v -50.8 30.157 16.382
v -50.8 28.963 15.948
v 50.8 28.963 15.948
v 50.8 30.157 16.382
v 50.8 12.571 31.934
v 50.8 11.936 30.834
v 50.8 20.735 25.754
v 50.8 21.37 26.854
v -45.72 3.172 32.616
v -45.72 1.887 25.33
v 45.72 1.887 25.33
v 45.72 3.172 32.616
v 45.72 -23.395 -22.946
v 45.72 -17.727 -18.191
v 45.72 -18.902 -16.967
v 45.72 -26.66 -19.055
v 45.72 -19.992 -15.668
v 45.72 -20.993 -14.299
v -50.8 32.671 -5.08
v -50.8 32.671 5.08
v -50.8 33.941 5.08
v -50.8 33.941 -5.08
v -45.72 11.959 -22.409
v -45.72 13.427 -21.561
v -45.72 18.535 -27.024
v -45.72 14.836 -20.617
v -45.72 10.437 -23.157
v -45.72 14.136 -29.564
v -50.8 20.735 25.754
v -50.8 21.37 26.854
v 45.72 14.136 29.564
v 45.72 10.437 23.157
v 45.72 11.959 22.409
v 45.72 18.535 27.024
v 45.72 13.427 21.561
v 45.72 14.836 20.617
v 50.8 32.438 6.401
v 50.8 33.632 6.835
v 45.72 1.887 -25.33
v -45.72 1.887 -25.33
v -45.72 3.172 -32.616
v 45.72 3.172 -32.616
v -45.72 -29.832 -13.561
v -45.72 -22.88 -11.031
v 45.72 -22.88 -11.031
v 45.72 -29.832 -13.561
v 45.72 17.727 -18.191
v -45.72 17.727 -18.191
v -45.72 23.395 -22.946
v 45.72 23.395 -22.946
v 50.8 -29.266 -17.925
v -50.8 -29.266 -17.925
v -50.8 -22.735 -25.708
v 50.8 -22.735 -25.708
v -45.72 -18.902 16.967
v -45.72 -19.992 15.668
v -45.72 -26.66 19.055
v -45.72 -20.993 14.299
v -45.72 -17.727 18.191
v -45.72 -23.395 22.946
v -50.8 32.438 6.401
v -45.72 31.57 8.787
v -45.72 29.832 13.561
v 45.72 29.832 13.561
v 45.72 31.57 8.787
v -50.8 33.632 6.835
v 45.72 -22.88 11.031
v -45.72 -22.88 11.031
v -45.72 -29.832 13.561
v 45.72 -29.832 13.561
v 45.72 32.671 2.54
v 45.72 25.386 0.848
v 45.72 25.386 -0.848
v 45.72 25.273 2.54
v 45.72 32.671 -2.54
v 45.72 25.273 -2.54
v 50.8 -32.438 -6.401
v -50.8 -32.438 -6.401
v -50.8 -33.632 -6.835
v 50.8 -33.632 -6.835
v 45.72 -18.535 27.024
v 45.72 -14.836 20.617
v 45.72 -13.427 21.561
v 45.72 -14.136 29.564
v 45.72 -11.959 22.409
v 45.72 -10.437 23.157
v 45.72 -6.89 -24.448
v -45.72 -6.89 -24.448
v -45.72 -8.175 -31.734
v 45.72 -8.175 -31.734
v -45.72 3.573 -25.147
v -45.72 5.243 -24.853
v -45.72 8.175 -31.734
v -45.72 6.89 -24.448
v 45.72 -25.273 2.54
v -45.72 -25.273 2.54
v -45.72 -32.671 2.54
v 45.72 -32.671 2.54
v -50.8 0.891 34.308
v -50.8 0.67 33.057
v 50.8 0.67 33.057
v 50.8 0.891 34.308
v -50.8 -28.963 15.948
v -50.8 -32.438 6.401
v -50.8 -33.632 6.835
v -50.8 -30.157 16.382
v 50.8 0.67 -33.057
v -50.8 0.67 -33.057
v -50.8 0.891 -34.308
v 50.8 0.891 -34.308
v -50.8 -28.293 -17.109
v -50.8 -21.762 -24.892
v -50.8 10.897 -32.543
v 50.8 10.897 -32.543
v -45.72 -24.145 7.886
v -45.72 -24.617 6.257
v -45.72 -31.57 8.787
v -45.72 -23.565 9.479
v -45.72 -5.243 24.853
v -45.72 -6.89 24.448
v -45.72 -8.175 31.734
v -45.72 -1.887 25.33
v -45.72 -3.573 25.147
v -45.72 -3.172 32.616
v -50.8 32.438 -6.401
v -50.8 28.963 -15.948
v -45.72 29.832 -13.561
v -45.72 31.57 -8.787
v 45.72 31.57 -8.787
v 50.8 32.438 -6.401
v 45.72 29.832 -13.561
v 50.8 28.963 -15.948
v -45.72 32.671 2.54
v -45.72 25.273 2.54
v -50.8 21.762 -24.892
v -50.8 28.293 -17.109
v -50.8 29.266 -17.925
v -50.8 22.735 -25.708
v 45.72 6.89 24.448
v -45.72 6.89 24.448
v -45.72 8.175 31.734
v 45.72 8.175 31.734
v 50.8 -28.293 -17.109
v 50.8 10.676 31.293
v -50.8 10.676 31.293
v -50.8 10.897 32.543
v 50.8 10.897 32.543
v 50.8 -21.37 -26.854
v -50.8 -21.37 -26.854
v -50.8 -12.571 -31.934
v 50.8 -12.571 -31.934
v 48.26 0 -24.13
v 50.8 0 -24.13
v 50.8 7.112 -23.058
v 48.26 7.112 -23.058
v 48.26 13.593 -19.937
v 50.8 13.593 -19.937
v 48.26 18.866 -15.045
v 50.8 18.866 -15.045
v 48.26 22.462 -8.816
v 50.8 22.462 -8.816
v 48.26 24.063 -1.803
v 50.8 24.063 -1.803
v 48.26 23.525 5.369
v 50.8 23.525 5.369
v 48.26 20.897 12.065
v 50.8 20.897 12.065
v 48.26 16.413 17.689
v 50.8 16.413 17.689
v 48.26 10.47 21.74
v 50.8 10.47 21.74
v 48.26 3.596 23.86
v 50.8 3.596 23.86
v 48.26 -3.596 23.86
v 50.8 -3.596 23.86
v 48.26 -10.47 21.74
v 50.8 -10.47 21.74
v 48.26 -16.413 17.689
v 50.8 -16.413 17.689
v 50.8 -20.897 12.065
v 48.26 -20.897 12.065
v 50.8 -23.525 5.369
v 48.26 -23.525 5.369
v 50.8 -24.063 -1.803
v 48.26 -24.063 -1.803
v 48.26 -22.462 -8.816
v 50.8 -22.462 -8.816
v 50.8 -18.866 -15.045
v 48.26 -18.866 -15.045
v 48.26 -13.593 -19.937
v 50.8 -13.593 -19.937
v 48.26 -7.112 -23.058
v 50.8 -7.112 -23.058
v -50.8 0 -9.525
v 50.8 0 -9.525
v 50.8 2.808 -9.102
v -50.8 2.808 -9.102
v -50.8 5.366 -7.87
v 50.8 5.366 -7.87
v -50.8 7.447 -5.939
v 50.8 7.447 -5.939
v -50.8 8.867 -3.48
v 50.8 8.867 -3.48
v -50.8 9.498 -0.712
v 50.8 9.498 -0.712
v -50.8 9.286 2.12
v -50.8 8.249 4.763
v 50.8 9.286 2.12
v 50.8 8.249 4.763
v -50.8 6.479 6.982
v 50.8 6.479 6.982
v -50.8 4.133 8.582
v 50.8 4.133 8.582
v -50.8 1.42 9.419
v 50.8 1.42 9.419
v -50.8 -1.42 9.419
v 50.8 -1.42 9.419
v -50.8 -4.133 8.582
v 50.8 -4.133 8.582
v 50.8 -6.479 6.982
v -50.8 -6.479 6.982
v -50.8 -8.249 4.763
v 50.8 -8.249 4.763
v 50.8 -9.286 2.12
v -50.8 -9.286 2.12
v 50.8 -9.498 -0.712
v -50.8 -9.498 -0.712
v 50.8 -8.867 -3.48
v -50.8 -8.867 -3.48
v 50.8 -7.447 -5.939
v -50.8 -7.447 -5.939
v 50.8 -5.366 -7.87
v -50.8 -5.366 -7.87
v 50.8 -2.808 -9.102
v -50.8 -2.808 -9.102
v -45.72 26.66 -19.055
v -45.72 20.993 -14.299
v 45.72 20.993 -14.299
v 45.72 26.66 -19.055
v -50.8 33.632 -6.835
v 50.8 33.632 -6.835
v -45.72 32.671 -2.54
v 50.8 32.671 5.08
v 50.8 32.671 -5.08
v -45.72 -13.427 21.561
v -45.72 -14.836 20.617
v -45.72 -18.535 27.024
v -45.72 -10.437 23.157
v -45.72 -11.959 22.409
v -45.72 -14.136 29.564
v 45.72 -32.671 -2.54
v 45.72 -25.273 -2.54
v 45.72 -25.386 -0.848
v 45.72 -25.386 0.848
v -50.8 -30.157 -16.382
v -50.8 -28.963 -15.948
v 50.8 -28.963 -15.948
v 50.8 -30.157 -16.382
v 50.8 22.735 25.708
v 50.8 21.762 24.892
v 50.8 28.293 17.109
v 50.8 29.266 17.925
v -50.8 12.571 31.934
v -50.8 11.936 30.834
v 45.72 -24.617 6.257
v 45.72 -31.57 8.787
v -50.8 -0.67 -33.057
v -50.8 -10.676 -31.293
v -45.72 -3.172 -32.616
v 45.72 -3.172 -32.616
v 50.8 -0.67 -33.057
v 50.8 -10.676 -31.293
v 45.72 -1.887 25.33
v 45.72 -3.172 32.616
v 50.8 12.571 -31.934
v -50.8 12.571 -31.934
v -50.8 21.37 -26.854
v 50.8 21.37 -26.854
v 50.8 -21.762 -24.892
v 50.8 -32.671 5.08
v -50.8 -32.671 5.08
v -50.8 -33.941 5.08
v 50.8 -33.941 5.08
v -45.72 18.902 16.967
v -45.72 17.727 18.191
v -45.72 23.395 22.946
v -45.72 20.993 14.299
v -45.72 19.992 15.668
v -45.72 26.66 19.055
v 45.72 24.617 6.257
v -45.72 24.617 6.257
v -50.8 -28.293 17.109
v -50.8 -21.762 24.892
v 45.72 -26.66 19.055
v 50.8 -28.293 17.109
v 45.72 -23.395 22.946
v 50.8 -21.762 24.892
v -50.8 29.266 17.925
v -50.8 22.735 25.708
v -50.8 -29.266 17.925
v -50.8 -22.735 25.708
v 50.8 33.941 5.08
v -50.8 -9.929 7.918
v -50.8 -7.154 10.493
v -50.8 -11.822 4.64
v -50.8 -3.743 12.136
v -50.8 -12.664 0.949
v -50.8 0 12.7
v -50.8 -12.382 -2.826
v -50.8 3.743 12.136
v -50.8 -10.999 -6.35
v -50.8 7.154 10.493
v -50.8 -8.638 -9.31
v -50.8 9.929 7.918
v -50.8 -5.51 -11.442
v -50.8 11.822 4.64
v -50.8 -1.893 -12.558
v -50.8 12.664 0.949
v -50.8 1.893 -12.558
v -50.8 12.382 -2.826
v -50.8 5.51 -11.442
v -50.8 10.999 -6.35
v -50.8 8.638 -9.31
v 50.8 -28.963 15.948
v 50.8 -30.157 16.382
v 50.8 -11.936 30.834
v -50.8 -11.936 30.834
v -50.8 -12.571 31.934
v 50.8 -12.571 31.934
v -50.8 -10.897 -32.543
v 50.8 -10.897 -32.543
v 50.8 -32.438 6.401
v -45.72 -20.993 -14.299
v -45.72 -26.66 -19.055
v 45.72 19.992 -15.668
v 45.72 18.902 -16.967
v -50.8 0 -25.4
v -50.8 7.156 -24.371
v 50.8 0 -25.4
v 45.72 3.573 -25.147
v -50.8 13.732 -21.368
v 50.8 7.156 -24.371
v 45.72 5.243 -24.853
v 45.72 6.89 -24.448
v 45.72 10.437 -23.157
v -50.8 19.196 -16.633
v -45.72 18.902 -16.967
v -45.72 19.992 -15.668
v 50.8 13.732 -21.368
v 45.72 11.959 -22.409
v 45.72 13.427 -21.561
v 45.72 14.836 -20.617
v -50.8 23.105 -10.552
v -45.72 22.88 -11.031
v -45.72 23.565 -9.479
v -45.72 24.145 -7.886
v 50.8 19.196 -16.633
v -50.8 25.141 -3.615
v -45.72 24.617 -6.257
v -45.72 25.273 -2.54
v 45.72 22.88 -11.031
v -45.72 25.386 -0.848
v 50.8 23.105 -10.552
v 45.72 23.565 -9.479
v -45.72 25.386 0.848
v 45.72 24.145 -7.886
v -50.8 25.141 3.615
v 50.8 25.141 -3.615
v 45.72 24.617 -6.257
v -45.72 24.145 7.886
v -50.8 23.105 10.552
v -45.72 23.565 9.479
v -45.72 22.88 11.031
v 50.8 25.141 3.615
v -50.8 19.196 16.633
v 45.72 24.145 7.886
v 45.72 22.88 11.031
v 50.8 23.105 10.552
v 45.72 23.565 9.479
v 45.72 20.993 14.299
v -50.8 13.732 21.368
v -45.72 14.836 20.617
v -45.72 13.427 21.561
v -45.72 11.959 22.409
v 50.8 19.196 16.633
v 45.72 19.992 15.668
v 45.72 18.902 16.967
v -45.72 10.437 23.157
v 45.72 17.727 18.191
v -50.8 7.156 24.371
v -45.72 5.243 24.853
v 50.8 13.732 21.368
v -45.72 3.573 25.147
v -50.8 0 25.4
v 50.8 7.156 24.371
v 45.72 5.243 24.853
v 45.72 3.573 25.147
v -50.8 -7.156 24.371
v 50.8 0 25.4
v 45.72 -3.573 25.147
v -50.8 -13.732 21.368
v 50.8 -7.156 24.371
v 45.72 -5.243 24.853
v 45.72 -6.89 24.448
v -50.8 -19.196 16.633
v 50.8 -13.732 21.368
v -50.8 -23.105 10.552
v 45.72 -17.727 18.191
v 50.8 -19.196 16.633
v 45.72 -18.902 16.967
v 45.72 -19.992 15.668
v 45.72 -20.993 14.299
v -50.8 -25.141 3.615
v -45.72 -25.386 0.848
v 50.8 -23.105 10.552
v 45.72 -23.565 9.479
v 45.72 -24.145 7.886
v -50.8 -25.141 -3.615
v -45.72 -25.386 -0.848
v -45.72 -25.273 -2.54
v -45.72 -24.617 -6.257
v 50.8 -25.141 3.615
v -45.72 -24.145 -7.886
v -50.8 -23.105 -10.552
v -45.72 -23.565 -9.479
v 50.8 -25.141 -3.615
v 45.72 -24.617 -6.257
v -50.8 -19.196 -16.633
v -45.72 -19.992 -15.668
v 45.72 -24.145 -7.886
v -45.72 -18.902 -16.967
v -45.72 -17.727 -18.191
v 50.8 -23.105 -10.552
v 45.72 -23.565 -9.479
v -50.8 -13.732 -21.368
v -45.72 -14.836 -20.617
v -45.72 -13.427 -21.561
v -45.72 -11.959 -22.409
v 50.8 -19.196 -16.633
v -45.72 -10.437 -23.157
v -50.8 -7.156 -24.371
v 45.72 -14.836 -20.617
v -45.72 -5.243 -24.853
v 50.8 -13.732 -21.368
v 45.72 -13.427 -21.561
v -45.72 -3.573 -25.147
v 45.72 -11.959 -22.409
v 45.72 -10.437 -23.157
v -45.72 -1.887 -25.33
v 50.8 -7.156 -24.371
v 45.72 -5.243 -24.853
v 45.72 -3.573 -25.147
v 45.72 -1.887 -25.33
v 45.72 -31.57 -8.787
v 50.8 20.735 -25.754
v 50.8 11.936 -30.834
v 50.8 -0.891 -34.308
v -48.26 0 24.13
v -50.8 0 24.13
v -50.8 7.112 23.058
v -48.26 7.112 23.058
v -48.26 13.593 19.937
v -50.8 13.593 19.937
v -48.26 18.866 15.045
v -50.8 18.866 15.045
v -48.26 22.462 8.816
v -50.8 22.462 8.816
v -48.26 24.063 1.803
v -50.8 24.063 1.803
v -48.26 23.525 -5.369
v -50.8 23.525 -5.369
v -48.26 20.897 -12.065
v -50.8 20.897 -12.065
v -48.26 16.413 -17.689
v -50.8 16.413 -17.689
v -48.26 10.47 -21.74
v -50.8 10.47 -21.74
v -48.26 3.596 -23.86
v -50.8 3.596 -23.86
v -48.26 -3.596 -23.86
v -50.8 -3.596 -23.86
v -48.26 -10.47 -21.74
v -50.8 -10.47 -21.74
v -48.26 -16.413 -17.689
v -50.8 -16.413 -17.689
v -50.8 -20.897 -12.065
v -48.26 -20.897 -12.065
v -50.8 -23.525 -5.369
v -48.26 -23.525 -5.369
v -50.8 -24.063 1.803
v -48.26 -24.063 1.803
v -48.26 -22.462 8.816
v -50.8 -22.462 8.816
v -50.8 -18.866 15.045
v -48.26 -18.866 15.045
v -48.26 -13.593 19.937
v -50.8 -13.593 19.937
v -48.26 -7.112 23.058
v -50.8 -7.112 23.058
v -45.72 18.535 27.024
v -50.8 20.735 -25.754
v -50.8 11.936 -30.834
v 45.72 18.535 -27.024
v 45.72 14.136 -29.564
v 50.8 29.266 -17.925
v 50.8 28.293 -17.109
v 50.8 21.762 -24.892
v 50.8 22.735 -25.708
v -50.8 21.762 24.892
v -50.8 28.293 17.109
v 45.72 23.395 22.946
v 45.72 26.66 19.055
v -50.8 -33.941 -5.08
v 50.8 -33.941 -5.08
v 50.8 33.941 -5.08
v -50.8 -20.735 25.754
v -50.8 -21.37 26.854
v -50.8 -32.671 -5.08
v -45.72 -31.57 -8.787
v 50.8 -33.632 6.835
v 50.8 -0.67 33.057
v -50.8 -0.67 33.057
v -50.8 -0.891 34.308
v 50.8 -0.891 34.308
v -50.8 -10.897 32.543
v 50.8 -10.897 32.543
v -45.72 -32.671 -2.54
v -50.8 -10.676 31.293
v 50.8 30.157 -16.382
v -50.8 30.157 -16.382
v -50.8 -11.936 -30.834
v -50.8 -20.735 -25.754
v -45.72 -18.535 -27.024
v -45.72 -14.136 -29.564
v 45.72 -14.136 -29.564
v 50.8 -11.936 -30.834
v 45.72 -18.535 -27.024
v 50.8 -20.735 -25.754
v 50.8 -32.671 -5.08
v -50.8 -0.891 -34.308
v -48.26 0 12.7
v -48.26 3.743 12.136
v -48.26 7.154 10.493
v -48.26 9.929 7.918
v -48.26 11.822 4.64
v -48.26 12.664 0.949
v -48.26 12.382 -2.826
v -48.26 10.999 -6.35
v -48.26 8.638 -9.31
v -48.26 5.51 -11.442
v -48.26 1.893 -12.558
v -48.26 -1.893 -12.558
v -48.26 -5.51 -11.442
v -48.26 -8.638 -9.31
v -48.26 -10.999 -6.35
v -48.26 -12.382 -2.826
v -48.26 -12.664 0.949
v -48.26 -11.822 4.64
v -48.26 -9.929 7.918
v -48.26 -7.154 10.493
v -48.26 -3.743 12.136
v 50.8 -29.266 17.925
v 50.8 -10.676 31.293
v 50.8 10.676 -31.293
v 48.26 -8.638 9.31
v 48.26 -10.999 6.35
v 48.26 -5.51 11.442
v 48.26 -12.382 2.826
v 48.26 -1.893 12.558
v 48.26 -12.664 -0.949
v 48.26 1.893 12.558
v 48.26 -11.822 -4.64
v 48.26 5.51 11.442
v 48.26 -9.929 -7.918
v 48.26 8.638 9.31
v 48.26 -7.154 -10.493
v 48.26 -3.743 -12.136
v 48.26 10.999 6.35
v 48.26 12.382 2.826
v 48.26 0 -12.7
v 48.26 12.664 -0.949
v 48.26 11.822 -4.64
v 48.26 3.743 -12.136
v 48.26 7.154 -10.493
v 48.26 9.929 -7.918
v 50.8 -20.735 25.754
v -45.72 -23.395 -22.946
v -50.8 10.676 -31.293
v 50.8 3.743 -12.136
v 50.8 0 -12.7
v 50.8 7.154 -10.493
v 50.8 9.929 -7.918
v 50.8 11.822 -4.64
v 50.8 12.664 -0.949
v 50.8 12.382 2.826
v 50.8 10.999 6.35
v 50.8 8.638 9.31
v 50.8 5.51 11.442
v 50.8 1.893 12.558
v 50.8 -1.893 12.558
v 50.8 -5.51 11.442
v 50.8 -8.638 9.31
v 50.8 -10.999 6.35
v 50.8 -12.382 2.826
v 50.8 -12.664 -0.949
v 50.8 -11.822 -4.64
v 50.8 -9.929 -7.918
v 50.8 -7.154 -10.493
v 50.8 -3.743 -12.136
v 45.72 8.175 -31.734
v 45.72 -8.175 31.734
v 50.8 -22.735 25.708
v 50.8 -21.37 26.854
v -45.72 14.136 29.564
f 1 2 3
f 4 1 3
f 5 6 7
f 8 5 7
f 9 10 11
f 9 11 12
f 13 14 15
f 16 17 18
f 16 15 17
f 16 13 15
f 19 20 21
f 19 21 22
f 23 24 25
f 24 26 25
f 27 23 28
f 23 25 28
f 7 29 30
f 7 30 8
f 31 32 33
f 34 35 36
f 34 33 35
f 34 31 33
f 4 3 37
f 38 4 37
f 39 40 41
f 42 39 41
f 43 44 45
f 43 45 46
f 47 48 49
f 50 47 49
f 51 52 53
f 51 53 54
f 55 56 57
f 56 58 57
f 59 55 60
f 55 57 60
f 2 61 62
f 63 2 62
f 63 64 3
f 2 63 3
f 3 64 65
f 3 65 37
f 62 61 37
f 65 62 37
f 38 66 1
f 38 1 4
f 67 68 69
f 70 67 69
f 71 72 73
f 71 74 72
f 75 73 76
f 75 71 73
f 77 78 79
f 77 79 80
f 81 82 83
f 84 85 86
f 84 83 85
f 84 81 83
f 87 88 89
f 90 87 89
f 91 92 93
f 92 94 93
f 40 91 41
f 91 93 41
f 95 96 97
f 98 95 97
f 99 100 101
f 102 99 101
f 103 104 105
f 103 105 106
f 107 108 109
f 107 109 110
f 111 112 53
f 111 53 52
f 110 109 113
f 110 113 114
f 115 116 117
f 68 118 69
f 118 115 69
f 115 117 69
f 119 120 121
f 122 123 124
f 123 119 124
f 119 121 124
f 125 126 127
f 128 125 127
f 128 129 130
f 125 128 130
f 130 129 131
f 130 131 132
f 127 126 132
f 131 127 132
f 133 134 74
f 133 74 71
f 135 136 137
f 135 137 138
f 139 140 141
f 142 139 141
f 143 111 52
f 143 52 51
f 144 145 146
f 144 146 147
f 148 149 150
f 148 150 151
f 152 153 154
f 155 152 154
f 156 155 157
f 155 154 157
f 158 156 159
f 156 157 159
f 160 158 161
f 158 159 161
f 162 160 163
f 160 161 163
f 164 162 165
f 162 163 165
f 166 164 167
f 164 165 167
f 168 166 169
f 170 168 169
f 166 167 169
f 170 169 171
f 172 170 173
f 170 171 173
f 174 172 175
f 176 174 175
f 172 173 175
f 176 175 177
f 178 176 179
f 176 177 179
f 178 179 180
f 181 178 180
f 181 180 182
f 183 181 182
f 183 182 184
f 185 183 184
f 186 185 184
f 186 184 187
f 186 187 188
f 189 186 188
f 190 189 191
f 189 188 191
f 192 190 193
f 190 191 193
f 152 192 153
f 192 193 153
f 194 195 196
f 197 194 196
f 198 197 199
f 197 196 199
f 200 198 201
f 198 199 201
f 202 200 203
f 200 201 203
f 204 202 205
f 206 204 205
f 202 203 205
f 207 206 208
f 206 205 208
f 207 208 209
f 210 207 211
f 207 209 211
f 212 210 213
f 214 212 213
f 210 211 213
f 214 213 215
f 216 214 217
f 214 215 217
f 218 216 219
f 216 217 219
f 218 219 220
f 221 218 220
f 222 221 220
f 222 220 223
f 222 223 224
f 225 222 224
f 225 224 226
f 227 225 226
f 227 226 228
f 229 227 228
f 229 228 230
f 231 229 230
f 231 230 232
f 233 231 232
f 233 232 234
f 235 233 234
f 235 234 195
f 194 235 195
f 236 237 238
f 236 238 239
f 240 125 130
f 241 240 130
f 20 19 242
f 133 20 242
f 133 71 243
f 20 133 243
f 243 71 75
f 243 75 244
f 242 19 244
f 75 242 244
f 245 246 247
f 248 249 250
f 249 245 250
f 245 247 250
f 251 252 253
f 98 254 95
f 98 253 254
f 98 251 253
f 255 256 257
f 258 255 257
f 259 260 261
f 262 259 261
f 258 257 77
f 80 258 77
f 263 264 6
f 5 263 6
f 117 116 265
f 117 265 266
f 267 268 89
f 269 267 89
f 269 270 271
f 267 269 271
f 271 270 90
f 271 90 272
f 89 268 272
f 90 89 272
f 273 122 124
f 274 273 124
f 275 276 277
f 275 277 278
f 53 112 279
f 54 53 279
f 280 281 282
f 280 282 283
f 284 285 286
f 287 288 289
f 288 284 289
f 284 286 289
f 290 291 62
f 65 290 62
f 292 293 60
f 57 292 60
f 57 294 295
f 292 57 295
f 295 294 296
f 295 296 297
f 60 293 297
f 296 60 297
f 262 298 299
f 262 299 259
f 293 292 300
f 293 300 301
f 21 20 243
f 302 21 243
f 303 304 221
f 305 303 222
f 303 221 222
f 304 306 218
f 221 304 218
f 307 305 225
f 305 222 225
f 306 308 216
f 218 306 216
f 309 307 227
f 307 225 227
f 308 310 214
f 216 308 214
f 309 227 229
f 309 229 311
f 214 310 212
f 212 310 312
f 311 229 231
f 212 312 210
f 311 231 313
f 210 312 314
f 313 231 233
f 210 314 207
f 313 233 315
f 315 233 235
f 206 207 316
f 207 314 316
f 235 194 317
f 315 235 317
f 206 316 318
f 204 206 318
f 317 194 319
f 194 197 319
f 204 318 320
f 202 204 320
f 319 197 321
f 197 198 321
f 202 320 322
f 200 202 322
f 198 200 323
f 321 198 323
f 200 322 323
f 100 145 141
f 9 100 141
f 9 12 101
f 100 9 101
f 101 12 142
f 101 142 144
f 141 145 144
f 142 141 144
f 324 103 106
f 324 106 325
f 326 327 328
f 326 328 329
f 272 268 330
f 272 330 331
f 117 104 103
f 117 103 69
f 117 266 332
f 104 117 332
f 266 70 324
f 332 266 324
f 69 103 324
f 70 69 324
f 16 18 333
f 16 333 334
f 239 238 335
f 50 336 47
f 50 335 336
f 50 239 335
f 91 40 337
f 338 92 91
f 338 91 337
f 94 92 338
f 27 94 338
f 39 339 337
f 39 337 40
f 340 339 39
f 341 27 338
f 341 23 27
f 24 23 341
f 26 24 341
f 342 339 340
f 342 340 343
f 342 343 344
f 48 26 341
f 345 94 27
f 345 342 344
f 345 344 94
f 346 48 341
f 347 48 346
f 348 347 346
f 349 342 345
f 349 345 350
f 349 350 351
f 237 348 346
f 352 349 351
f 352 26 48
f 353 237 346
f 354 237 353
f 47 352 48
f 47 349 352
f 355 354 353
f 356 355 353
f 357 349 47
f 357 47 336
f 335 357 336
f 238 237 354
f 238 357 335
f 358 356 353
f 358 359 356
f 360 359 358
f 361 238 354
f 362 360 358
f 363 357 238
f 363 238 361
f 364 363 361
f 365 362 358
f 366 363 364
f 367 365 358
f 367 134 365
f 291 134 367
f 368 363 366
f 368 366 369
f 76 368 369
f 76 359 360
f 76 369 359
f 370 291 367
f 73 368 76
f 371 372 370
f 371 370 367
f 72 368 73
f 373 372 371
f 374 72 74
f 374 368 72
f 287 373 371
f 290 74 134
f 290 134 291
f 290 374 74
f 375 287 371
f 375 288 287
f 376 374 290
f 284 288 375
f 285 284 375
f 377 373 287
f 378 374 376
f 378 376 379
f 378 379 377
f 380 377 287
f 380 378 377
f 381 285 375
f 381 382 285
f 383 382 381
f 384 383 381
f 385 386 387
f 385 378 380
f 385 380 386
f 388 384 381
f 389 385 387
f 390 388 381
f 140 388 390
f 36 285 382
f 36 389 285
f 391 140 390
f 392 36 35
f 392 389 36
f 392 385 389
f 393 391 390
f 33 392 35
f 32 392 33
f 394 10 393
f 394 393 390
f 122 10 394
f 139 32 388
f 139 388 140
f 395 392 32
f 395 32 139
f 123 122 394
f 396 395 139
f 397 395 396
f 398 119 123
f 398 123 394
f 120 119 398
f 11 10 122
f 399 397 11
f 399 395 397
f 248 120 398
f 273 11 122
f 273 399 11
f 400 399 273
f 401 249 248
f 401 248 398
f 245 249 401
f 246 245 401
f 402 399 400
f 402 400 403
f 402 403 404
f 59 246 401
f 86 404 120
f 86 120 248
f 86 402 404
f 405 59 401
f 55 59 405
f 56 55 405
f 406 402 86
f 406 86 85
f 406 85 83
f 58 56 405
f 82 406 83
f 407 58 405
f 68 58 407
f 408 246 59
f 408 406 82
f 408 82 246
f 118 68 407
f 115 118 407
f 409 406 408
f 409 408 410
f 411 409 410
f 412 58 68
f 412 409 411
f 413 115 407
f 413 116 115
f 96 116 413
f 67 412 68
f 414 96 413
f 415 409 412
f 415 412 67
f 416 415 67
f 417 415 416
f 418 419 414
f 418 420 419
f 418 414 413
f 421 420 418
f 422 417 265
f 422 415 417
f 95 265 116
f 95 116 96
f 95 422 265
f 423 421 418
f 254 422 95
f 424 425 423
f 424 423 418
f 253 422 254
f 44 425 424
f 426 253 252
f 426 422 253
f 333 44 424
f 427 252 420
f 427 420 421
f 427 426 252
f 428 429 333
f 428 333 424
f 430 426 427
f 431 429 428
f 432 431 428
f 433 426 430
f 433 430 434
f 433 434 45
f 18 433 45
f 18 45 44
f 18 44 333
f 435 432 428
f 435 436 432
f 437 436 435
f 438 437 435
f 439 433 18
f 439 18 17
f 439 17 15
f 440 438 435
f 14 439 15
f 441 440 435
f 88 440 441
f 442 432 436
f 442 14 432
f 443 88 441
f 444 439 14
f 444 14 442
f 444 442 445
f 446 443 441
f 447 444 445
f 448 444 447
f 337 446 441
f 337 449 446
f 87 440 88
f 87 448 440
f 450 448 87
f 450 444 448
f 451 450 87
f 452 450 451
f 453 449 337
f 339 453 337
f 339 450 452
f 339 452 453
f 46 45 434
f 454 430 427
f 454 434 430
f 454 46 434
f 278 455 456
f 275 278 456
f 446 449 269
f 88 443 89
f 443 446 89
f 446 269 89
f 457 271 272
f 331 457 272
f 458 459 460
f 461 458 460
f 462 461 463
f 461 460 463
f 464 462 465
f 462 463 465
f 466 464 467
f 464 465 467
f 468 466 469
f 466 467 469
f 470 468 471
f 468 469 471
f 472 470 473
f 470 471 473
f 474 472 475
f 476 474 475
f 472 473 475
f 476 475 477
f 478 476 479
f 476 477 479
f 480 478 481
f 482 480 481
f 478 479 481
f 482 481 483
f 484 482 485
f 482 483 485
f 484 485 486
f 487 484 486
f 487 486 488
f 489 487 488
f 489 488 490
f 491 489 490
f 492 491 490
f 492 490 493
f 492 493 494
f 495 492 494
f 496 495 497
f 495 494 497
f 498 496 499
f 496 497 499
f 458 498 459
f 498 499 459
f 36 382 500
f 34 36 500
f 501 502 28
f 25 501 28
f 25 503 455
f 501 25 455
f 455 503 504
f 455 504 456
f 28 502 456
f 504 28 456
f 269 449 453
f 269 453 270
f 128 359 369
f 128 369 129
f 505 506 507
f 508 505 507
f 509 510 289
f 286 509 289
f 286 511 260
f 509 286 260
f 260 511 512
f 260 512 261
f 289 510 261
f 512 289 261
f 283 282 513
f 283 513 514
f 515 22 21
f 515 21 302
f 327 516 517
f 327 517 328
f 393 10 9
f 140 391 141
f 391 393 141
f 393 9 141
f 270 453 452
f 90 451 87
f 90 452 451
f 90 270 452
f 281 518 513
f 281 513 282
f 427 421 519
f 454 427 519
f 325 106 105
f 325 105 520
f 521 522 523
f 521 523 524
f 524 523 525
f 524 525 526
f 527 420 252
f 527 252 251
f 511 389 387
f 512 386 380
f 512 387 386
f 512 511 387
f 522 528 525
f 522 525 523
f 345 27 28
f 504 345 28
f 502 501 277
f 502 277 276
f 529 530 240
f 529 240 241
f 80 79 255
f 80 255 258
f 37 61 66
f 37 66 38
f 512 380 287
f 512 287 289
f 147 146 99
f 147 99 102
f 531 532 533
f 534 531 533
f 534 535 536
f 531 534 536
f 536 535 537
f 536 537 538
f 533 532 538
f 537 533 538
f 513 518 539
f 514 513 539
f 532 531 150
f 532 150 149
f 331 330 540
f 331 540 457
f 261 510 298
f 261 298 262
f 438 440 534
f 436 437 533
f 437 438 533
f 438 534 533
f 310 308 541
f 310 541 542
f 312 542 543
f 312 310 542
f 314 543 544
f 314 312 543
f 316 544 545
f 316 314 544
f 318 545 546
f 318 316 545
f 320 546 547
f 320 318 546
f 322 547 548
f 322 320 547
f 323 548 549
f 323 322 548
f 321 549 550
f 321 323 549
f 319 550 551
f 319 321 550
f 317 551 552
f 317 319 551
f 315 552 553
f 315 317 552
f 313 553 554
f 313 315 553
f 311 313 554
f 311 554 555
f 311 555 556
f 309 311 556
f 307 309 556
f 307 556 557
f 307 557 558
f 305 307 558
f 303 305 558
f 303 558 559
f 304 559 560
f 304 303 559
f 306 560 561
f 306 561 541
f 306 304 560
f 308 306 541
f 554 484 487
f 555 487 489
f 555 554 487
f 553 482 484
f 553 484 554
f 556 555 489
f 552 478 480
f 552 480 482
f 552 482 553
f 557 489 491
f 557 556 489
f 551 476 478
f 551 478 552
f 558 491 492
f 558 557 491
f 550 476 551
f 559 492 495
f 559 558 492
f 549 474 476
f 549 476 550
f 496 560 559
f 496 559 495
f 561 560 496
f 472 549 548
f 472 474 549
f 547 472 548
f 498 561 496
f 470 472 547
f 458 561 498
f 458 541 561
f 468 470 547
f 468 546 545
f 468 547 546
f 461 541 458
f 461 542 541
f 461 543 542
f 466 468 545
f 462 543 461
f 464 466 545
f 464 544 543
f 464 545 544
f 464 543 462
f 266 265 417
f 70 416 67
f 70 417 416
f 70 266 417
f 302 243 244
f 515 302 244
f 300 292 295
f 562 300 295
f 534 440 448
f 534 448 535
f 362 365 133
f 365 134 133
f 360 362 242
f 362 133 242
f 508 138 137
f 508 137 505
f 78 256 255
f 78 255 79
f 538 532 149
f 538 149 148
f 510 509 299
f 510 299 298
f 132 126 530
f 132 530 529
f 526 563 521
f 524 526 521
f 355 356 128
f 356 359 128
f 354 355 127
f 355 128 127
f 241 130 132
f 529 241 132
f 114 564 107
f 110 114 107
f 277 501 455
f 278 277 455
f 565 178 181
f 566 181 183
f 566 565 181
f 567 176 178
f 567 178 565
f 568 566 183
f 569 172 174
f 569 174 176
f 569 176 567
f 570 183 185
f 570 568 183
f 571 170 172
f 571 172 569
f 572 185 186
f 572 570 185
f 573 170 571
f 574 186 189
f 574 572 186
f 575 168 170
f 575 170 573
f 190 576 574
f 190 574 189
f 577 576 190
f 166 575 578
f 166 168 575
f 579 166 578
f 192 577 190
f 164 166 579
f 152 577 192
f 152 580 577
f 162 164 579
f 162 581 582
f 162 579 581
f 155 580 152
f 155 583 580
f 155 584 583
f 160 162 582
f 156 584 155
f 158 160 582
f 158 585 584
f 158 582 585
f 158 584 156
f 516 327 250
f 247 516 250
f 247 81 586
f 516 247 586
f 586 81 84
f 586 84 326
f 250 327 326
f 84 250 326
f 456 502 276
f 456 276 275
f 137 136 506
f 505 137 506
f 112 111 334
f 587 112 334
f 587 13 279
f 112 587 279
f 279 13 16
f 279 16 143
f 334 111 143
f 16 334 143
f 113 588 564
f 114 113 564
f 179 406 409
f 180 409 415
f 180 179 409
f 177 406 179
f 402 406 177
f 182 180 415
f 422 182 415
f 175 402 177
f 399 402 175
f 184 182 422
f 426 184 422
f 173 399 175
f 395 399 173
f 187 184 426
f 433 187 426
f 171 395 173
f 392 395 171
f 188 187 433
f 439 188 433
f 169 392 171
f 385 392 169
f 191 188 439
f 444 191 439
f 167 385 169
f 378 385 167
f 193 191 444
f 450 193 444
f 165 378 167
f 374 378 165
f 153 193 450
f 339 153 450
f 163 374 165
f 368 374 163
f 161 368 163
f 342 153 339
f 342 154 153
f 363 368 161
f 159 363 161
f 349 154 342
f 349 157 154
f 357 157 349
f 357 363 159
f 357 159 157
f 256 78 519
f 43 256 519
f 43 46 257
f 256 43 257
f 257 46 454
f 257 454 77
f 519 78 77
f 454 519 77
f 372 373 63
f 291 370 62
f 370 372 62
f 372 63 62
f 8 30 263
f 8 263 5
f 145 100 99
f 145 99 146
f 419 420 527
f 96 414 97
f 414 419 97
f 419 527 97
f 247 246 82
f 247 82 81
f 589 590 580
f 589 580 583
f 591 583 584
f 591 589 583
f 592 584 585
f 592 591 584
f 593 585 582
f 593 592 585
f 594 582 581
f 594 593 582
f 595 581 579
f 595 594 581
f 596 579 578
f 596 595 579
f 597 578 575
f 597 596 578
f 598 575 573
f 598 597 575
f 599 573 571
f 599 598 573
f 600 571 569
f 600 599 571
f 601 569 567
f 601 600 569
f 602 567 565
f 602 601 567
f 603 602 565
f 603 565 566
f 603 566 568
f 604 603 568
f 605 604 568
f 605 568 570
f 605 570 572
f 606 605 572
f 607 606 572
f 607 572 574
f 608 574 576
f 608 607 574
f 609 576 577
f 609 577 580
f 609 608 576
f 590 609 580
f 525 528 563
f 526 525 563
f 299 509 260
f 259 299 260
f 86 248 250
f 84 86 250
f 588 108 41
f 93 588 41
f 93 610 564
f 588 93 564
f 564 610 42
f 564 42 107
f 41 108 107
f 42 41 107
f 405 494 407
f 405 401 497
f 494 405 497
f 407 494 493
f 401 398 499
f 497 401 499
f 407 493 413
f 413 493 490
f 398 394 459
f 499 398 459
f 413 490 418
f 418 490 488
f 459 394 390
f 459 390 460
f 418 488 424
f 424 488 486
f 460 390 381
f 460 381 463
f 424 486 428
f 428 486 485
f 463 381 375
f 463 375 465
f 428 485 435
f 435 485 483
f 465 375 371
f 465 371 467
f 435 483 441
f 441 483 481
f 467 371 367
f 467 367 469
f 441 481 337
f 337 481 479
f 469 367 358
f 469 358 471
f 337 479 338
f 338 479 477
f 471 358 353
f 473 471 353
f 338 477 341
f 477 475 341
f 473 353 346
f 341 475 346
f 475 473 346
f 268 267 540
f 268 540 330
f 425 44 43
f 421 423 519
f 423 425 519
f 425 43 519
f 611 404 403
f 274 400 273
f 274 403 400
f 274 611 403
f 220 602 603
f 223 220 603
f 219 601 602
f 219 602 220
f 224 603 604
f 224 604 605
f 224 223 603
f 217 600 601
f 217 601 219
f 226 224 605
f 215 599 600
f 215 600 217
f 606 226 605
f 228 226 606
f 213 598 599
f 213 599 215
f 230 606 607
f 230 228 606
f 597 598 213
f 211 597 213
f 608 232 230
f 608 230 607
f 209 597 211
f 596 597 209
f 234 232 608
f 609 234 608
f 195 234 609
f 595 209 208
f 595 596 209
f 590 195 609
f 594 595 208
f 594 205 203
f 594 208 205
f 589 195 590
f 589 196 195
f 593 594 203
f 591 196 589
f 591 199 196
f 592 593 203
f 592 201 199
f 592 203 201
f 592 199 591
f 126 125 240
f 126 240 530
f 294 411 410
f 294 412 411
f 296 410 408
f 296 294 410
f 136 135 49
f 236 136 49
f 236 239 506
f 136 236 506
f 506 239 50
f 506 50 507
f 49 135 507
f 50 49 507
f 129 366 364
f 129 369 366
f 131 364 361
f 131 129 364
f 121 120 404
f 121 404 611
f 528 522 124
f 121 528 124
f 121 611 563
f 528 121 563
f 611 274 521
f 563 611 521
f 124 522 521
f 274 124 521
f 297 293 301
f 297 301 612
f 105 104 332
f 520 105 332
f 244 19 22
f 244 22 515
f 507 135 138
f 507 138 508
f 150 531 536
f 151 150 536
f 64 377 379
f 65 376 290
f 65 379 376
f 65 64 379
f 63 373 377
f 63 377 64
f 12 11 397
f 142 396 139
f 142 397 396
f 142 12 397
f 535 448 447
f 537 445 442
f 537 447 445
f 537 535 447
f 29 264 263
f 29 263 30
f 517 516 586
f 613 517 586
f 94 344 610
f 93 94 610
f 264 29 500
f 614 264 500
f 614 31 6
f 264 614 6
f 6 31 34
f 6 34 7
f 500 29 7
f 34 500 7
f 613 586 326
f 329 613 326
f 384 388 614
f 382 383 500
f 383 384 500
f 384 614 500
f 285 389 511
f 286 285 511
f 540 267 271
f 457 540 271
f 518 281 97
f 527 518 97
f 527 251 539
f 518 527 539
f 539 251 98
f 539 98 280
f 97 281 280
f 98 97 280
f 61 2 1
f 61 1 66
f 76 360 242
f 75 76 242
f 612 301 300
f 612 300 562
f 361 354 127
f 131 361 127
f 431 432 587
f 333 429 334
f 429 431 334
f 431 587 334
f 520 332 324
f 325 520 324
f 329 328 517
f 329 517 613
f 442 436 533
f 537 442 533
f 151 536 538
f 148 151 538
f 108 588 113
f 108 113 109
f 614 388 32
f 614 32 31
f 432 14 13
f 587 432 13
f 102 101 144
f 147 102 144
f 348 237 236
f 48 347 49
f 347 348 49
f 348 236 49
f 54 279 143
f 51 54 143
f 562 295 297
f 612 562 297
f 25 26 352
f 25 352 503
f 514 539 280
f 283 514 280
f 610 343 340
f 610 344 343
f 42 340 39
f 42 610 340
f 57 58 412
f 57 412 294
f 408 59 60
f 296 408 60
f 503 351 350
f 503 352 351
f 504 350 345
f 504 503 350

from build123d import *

# Parameters (mm, degrees)
SKETCH1_R               = 25.4
BOSS_EXTRUDE1_DEPTH     = 50.8
SKETCH2_R               = 24.13
SKETCH2_R_2             = 12.7
CUT_EXTRUDE1_DEPTH      = 2.54
SKETCH3_R               = 24.13
SKETCH3_R_2             = 12.7
CUT_EXTRUDE2_DEPTH      = 2.54
SKETCH4_W               = 5.08
SKETCH4_H               = 7.62
BOSS_EXTRUDE2_DEPTH     = 45.72
SKETCH5_W               = 101.6
SKETCH5_H               = 10.16
BOSS_EXTRUDE3_DEPTH     = 1.27
CIRPATTERN1_COUNT       = 18
SKETCH6_R               = 9.525
CUT_EXTRUDE3_DEPTH      = 1
CUT_EXTRUDE3_DEPTH_BACK = 102.6


with BuildPart() as part:
    # Sketch1 → Boss-Extrude1 (new body, symmetric)
    with BuildSketch(Plane(origin=(0, 0, 0), x_dir=(0, 0, -1), z_dir=(1, 0, 0))):
        Circle(SKETCH1_R)
    extrude(amount=BOSS_EXTRUDE1_DEPTH, both=True)

    # Sketch2 → Cut-Extrude1 (cut)
    with BuildSketch(Plane(origin=(50.8, 0, 0), x_dir=(0, 0, -1), z_dir=(1, 0, 0))):
        Circle(SKETCH2_R)
        Circle(SKETCH2_R_2, mode=Mode.SUBTRACT)
    extrude(amount=-CUT_EXTRUDE1_DEPTH, mode=Mode.SUBTRACT)

    # Sketch3 → Cut-Extrude2 (cut)
    with BuildSketch(Plane.ZY.offset(50.8)):
        Circle(SKETCH3_R)
        Circle(SKETCH3_R_2, mode=Mode.SUBTRACT)
    extrude(amount=-CUT_EXTRUDE2_DEPTH, mode=Mode.SUBTRACT)

    # Sketch4 → Boss-Extrude2 (add, symmetric)
    with BuildSketch(Plane(origin=(0, 0, 0), x_dir=(0, 0, -1), z_dir=(1, 0, 0))):
        with Locations((0, 28.861090904)):
            Rectangle(SKETCH4_W, SKETCH4_H)
    boss_extrude2 = extrude(amount=BOSS_EXTRUDE2_DEPTH, both=True)

    # Sketch5 → Boss-Extrude3 (add)
    with BuildSketch(Plane(origin=(0, 32.671090904, 0), x_dir=(1, 0, 0), z_dir=(0, 1, 0))):
        Rectangle(SKETCH5_W, SKETCH5_H)
    boss_extrude3 = extrude(amount=BOSS_EXTRUDE3_DEPTH)

    # CirPattern1: Boss-Extrude2, Boss-Extrude3 ×18 about axis
    cirpattern1_axis = Axis((0, 0, 0), (1, 0, 0))
    for i in range(1, CIRPATTERN1_COUNT):
        add(boss_extrude2.rotate(cirpattern1_axis, i * 360 / CIRPATTERN1_COUNT))
        add(boss_extrude3.rotate(cirpattern1_axis, i * 360 / CIRPATTERN1_COUNT))

    # Sketch6 → Cut-Extrude3 (cut, two sides)
    with BuildSketch(Plane(origin=(50.8, 0, 0), x_dir=(0, 0, -1), z_dir=(1, 0, 0))) as cut_extrude3_sk:
        Circle(SKETCH6_R)
    extrude(amount=CUT_EXTRUDE3_DEPTH, mode=Mode.SUBTRACT)
    extrude(cut_extrude3_sk.sketch, amount=-CUT_EXTRUDE3_DEPTH_BACK, mode=Mode.SUBTRACT)


solid = part.part
